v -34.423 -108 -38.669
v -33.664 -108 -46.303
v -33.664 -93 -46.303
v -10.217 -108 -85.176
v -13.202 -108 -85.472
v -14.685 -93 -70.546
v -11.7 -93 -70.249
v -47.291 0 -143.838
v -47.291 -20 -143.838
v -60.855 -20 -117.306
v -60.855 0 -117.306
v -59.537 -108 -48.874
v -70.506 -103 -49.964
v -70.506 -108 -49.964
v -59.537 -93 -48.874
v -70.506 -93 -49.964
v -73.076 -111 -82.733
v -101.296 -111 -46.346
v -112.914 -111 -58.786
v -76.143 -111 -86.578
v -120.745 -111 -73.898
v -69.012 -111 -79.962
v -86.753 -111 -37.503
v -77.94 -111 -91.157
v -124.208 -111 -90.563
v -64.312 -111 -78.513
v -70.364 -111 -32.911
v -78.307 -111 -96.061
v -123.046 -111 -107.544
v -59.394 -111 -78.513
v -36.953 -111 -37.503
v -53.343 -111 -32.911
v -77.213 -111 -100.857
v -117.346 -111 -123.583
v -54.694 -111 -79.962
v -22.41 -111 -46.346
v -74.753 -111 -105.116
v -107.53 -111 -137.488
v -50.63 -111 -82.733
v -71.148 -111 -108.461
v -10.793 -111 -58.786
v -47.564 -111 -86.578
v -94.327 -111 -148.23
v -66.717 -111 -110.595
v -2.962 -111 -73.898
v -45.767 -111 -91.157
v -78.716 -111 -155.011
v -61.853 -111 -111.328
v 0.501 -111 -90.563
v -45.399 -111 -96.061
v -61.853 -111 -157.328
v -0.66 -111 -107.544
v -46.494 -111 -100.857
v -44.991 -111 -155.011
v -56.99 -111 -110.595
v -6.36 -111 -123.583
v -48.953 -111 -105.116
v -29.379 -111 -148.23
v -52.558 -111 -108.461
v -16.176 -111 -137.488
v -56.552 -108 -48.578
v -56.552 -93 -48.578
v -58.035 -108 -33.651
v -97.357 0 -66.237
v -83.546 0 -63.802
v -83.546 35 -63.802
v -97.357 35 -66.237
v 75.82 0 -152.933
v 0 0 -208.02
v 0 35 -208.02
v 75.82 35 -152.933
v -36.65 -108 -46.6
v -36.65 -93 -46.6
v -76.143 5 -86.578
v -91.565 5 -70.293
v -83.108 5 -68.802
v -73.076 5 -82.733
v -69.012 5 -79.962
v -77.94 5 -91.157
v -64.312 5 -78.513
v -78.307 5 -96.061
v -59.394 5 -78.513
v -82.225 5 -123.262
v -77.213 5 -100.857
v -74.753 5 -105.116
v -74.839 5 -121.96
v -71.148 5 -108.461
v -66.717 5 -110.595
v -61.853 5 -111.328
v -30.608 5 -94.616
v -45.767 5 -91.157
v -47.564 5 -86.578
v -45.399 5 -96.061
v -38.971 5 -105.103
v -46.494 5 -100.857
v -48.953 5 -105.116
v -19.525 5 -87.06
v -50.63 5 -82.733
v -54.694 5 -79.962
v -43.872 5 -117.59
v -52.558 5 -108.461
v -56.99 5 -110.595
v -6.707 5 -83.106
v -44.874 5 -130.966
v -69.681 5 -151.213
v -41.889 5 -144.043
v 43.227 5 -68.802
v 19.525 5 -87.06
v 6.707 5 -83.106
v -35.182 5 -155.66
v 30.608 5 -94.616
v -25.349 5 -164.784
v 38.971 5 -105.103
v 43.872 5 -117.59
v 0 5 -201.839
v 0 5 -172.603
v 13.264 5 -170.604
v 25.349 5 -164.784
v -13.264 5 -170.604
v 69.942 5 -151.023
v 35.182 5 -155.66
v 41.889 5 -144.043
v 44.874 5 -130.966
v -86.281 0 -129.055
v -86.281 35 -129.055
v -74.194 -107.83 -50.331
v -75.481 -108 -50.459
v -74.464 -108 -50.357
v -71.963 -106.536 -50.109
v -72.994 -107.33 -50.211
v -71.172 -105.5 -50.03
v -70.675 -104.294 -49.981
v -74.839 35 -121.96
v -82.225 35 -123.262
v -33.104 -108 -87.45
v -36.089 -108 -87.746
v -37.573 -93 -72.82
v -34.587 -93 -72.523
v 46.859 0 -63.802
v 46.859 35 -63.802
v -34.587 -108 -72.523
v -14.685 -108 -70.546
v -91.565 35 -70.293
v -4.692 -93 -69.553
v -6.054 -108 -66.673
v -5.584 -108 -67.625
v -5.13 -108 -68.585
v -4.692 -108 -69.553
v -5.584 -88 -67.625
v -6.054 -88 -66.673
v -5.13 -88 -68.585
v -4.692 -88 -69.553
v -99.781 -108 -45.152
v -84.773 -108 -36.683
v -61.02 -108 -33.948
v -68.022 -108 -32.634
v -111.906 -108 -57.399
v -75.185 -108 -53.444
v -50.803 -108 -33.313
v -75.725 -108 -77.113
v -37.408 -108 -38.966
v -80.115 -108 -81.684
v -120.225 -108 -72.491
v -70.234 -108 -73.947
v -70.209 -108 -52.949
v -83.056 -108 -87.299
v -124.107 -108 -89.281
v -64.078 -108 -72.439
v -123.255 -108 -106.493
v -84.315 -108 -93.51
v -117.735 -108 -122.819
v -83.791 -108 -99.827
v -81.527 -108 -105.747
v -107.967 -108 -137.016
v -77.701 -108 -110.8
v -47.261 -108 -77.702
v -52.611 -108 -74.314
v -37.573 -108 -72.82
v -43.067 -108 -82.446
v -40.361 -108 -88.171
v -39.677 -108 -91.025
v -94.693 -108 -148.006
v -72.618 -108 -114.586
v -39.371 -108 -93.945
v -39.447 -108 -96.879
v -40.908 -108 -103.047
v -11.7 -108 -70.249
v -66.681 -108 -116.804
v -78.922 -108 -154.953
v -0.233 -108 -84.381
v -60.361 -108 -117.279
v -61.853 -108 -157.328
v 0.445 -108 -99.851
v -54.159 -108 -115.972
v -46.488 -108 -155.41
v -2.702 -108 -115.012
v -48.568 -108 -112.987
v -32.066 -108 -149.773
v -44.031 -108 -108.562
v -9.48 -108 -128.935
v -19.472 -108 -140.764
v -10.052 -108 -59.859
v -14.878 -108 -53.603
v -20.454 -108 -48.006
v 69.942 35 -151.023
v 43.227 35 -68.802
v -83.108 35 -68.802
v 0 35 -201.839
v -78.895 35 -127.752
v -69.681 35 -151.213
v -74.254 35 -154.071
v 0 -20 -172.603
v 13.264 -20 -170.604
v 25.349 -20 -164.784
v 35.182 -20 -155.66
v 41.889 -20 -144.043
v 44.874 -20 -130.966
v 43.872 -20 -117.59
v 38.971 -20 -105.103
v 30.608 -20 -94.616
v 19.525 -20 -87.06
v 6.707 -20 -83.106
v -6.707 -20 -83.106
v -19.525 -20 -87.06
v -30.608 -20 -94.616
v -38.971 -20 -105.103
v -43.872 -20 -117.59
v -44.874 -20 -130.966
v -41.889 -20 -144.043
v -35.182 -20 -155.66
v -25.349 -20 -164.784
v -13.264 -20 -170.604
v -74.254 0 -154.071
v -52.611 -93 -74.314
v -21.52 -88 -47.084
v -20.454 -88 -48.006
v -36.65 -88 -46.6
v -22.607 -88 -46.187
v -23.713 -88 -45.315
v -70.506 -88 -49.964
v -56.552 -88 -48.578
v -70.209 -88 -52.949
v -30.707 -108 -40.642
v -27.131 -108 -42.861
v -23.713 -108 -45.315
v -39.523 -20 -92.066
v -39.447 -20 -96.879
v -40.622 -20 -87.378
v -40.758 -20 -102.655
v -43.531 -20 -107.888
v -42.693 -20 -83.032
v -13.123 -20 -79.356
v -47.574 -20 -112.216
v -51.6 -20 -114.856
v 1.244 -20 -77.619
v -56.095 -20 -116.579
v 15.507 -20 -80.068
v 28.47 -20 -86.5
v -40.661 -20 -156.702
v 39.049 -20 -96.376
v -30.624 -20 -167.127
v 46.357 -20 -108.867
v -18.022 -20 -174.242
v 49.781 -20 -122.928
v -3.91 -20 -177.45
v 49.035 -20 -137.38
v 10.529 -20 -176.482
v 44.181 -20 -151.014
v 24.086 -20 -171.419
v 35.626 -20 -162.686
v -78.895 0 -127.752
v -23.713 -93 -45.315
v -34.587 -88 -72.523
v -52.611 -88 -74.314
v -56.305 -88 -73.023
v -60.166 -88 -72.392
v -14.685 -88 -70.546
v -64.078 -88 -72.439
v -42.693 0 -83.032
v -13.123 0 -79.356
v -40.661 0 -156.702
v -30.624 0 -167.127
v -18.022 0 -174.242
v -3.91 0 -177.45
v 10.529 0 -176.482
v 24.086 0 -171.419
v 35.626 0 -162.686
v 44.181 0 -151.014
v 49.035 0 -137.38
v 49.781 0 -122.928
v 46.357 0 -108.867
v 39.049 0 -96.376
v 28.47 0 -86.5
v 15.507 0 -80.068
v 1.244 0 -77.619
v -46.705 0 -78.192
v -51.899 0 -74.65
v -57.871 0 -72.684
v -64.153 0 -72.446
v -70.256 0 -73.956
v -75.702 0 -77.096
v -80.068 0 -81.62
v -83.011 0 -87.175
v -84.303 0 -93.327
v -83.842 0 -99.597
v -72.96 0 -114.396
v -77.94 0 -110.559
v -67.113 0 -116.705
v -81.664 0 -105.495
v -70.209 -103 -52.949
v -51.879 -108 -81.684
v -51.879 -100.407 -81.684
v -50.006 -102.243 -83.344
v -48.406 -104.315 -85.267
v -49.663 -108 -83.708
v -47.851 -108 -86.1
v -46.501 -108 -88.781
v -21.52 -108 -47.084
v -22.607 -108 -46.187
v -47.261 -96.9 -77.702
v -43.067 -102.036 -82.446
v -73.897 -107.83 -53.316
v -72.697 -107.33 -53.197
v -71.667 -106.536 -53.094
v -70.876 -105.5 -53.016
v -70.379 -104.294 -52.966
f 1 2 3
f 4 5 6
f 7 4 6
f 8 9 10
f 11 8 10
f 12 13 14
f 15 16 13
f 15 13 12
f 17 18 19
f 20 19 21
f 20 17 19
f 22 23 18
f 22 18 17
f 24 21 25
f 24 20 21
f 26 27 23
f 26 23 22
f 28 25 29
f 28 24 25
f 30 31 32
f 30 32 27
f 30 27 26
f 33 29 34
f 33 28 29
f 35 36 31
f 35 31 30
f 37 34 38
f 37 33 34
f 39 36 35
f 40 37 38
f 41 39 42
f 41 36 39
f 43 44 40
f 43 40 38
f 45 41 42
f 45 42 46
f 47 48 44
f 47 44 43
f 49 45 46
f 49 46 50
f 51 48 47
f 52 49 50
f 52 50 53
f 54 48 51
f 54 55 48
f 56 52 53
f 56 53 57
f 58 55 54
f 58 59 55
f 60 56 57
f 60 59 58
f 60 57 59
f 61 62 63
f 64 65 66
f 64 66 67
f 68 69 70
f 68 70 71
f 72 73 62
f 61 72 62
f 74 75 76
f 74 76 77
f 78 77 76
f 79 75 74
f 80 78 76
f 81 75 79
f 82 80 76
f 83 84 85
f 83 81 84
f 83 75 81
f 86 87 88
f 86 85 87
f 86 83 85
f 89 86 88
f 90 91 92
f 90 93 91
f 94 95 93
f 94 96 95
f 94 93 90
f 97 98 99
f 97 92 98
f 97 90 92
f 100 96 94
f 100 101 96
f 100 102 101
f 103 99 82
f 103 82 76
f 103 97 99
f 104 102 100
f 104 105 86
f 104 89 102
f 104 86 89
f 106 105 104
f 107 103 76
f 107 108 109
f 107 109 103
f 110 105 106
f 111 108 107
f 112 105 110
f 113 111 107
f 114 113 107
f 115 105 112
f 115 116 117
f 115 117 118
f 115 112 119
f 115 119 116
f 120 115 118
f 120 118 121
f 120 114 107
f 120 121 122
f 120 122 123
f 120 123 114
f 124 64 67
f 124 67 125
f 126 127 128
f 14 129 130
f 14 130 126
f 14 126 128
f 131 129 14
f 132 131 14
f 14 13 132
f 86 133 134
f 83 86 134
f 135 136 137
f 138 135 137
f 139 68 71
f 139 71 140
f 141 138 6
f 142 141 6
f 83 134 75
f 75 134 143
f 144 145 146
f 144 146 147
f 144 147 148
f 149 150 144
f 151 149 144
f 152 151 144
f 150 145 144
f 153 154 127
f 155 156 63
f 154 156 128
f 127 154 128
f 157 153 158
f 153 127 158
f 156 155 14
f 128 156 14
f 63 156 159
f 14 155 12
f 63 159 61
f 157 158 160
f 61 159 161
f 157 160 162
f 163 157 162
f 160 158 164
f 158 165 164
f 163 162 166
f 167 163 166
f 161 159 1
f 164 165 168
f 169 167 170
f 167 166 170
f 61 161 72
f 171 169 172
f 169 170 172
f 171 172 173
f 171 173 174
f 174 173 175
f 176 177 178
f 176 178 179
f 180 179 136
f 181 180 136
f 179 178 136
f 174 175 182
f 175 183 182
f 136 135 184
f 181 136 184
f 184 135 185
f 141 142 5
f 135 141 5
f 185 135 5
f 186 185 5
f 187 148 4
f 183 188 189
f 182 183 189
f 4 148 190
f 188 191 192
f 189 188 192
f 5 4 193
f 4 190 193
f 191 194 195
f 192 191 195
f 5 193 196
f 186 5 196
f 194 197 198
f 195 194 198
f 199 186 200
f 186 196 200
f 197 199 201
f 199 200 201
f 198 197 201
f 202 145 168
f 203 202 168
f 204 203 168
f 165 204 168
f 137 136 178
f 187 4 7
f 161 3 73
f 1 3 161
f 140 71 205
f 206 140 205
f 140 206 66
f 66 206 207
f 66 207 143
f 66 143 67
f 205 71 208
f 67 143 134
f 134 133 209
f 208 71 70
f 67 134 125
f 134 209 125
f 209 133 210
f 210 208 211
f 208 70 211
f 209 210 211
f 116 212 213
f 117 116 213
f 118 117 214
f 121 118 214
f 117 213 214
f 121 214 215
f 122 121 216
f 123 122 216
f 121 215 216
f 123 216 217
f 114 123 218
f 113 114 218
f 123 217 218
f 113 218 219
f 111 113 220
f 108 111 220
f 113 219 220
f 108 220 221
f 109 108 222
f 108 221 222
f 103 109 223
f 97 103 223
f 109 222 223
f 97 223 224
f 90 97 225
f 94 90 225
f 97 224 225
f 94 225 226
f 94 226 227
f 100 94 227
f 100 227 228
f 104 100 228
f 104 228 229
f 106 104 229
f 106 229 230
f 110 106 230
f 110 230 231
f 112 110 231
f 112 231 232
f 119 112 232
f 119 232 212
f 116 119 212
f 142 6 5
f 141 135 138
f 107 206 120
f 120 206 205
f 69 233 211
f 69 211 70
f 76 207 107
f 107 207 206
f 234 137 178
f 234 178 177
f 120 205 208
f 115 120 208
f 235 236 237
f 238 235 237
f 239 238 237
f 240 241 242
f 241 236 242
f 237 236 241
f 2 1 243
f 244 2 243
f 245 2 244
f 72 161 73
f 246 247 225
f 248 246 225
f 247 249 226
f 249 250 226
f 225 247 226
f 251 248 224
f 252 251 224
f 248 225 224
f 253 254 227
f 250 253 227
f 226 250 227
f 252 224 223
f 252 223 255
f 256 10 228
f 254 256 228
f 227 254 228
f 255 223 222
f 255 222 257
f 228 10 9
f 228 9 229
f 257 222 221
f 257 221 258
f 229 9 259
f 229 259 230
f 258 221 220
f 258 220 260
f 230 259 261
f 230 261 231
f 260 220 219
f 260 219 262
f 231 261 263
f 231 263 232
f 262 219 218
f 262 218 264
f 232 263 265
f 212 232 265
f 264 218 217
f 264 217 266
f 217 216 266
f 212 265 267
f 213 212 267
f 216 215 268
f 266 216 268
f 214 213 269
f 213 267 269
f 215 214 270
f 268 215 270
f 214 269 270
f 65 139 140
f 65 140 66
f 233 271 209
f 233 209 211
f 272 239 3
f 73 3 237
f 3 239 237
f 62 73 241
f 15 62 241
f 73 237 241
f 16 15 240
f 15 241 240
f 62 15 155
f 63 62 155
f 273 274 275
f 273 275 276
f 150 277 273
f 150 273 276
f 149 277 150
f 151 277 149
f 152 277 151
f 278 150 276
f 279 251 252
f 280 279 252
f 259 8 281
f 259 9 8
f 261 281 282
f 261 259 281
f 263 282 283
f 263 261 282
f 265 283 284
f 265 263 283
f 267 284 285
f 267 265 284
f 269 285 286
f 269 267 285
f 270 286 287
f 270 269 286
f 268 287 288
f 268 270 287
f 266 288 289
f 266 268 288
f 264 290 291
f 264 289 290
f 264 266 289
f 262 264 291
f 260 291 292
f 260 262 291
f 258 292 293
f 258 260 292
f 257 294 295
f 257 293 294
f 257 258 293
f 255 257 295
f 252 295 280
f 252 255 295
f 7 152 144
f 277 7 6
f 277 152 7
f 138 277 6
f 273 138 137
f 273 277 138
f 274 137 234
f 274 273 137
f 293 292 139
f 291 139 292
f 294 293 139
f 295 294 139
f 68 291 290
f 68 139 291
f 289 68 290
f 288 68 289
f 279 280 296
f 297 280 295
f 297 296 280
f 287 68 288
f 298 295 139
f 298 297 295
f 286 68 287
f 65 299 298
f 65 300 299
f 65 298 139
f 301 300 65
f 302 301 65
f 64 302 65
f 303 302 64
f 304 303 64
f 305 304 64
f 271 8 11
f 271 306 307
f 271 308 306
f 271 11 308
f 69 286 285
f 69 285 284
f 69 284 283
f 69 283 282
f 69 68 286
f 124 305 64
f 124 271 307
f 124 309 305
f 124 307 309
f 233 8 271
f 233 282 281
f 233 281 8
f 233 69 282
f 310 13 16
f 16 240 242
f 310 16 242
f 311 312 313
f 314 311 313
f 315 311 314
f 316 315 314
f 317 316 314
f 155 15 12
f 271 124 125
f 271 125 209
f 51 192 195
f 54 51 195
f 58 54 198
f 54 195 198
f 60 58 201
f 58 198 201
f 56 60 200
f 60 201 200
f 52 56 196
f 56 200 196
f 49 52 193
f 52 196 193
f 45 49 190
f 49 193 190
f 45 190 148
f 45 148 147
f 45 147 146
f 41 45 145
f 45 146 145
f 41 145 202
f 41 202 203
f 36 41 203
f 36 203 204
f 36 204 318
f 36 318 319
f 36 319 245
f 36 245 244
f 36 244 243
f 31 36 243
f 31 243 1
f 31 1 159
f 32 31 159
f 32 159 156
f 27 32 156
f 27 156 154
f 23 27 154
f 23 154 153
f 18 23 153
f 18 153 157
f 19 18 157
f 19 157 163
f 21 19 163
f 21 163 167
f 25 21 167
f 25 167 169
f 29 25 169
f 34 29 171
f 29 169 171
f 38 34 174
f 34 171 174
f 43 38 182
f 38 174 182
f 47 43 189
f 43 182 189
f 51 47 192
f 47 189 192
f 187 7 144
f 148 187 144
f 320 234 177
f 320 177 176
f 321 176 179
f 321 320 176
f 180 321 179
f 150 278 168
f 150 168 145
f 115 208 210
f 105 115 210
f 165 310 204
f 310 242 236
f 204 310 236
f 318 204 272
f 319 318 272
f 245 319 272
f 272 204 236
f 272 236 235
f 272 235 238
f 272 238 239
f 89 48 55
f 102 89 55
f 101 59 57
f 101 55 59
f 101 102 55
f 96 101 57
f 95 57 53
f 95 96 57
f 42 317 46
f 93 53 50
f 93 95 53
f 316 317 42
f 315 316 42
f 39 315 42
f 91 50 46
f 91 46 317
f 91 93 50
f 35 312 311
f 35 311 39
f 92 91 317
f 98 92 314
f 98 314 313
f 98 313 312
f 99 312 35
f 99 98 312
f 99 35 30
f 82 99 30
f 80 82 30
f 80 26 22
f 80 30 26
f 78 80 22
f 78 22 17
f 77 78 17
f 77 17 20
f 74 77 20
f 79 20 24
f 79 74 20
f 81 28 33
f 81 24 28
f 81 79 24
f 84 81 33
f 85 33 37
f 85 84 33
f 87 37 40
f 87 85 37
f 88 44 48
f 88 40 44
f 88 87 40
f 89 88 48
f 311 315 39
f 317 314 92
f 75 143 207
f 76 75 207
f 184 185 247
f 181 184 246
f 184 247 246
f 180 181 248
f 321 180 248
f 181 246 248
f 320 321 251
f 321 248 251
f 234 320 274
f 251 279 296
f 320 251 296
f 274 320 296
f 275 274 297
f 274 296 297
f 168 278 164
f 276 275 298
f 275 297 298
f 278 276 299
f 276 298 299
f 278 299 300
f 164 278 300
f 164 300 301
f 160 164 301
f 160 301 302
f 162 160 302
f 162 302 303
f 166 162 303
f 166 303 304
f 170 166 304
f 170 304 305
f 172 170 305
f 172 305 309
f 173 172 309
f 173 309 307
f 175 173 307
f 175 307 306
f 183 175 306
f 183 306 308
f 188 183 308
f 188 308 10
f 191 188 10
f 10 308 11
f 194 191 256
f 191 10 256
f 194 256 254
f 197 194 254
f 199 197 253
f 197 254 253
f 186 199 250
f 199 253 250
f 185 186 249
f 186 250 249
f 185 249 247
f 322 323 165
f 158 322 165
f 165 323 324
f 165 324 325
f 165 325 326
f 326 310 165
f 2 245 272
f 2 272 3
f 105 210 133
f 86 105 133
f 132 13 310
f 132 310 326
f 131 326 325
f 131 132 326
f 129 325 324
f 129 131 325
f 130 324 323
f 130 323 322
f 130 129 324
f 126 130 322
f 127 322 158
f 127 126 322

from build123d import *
from build123d.topology import SkipClean

# Parameters (mm, degrees)
SKETCH1_R               = 45
BOSS_EXTRUDE1_DEPTH     = 35
CUT_EXTRUDE1_DEPTH      = 30
BOSS_EXTRUDE2_START     = 20
SKETCH3_R               = 50
SKETCH3_R_2             = 45
BOSS_EXTRUDE2_DEPTH     = 20
SKETCH4_R               = 22.5
BOSS_EXTRUDE3_DEPTH     = 108
SKETCH5_R               = 62.5
BOSS_EXTRUDE4_DEPTH     = 3
CUT_EXTRUDE2_DEPTH      = 283.934340716
CUT_EXTRUDE2_DEPTH_BACK = 283.934340716
SKETCH6_R               = 16.5
CHAMFER1_START          = -20
CHAMFER1_DEPTH          = 20
BOSS_EXTRUDE5_START     = 20
BOSS_EXTRUDE5_DEPTH     = 20
CHAMFER3_START          = -59.701385296
CHAMFER3_DEPTH          = 31.623598411
CHAMFER3_START_2        = -32.908910756
CHAMFER3_2_DEPTH        = 24.320342802
CHAMFER3_START_3        = -75.100600507
CHAMFER3_3_DEPTH        = 17.710815412
CHAMFER3_START_4        = -108
CHAMFER3_4_DEPTH        = 20.0000001
CUT_EXTRUDE3_START      = 20
CUT_EXTRUDE3_DEPTH      = 20
CUT_EXTRUDE4_DEPTH      = 3
FILLET2_R               = 5


with BuildPart() as part:
    # Sketch1 → Boss-Extrude1 (new body)
    with BuildSketch(Plane(origin=(0, 0, 0), x_dir=(1, 0, 0), z_dir=(0, 1, 0))):
        Polygon((46.859255168, 63.80155033), (-83.545615043, 63.80155033), (-97.357476794, 66.23695421), (-86.281022646, 129.054647247), (-78.894964498, 127.752285914), (-74.254340533, 154.070572239), (0, 208.019508525), (75.819867549, 152.933150283), align=None)
        with Locations(Location((0, 127.60310066, 0), (0, 0, 90))):
            Circle(SKETCH1_R, mode=Mode.SUBTRACT)
    extrude(amount=BOSS_EXTRUDE1_DEPTH)

    # Sketch2 → Cut-Extrude1 (cut)
    with BuildSketch(Plane(origin=(0, 35, 0), x_dir=(1, 0, 0), z_dir=(0, 1, 0))):
        Polygon((69.942015026, 151.023320226), (0, 201.839168637), (-69.681093857, 151.212890552), (-74.839166621, 121.960006261), (-82.225224769, 123.262367593), (-91.56519714, 70.292752087), (-83.108171726, 68.80155033), (43.226542528, 68.80155033), align=None)
    extrude(amount=-CUT_EXTRUDE1_DEPTH, mode=Mode.SUBTRACT)

    # Sketch3 → Boss-Extrude2 (add)
    with BuildSketch(Plane.XZ.offset(BOSS_EXTRUDE2_START)):
        with Locations(Location((0, -127.60310066, 0), (0, 0, 270))):
            Circle(SKETCH3_R)
        with Locations(Location((0, -127.60310066, 0), (0, 0, 270))):
            Circle(SKETCH3_R_2, mode=Mode.SUBTRACT)
    extrude(amount=-BOSS_EXTRUDE2_DEPTH)

    # Sketch4 → Boss-Extrude3 (add)
    with BuildSketch(Plane.XZ):
        with Locations(Location((-61.853227661, -94.828442341, 0), (0, 0, 354.769849307))):
            Circle(SKETCH4_R)
    extrude(amount=BOSS_EXTRUDE3_DEPTH)

    # Sketch5 → Boss-Extrude4 (add)
    with BuildSketch(Plane.XZ.offset(108)):
        with Locations(Location((-61.853227661, -94.828442341, 0), (0, 0, 270))):
            Circle(SKETCH5_R)
    extrude(amount=BOSS_EXTRUDE4_DEPTH)

    # Sketch6 → Cut-Extrude2 (cut, two sides: drawn at the far end of the back side and taken through both)
    with BuildSketch(Plane.XZ.offset(111).offset(-CUT_EXTRUDE2_DEPTH_BACK)):
        with Locations(Location((-61.853227661, -94.828442341, 0), (0, 0, 270))):
            Circle(SKETCH6_R)
    extrude(amount=CUT_EXTRUDE2_DEPTH + CUT_EXTRUDE2_DEPTH_BACK, mode=Mode.SUBTRACT)

    # Chamfer1: read off the stored shape, not the designer's step
    # Chamfer1 outline → Chamfer1 (add)
    with BuildSketch(Plane(origin=(0, 0, 0), x_dir=(1, 0, 0), z_dir=(0, 1, 0)).offset(CHAMFER1_START)):
        with BuildLine():
            ThreePointArc((-47.573643712, 112.216469321), (-49.998001272, 128.050167568), (-47.290893773, 143.837981816))
            Line((-47.290893773, 143.837981816), (-60.85462884, 117.306271426))
            ThreePointArc((-60.85462884, 117.306271426), (-53.801380758, 115.838386688), (-47.573643712, 112.216469321))
        make_face()
        with BuildLine():
            Line((-42.693487755, 83.032071427), (-13.123343442, 79.356050419))
            ThreePointArc((-13.123343442, 79.356050419), (-27.706953652, 85.981895496), (-39.446904898, 96.879466533))
            ThreePointArc((-39.446904898, 96.879466533), (-39.947247216, 89.692488608), (-42.693487755, 83.032071427))
        make_face()
    extrude(amount=CHAMFER1_DEPTH)

    # Sketch7 → Boss-Extrude5 (add)
    with SkipClean():  # the faces are left unmerged after this step: merging them gives an invalid solid
        with BuildSketch(Plane(origin=(0, -108, 0), x_dir=(1, 0, 0), z_dir=(0, 1, 0)).offset(BOSS_EXTRUDE5_START)):
            with BuildLine():
                Line((-70.209230864, 52.9494319), (-20.454240978, 48.005649797))
                ThreePointArc((-20.454240978, 48.005649797), (-22.061100088, 46.632627344), (-23.713465467, 45.314721618))
                Line((-23.713465467, 45.314721618), (-70.50585779, 49.964132507))
                Line((-70.50585779, 49.964132507), (-70.209230864, 52.9494319))
            make_face()
            with BuildLine():
                Line((-64.077929608, 72.438696893), (-6.054139097, 66.673305768))
                ThreePointArc((-6.054139097, 66.673305768), (-5.354795719, 68.104348565), (-4.69214598, 69.552747672))
                Line((-4.69214598, 69.552747672), (-52.611335155, 74.314119956))
                ThreePointArc((-52.611335155, 74.314119956), (-58.221486515, 72.623477665), (-64.077929608, 72.438696893))
            make_face()
        extrude(amount=-BOSS_EXTRUDE5_DEPTH)

    # Chamfer3: read off the stored shape, not the designer's step
    # Chamfer3 outline → Chamfer3 (add)
    with SkipClean():  # the faces are left unmerged after this step: merging them gives an invalid solid
        with BuildSketch(Plane(origin=(0, 0, 0), x_dir=(0, 1, 0), z_dir=(0.9950997977115372, 0, 0.09887564206849853)).offset(CHAMFER3_START)):
            Polygon((-108, -68.747986192), (-108, -83.747986192), (-93, -68.747986192), align=None)
            Polygon((-108, -27.747986192), (-108, -42.747986192), (-93, -42.747986192), align=None)
        extrude(amount=CHAMFER3_DEPTH)

    # Chamfer3 2 outline → Chamfer3 2 (add)
    with SkipClean():  # the faces are left unmerged after this step: merging them gives an invalid solid
        with BuildSketch(Plane(origin=(0, 0, 0), x_dir=(0, 1, 0), z_dir=(0.9950997977115372, 0, 0.09887564206849853)).offset(CHAMFER3_START_2)):
            Polygon((-108, -68.747986192), (-108, -83.747986192), (-93, -68.747986192), align=None)
        extrude(amount=CHAMFER3_2_DEPTH)

    # Chamfer3 3 outline → Chamfer3 3 (add)
    with SkipClean():  # the faces are left unmerged after this step: merging them gives an invalid solid
        with BuildSketch(Plane(origin=(0, 0, 0), x_dir=(0, 1, 0), z_dir=(0.9950997977115372, 0, 0.09887564206849853)).offset(CHAMFER3_START_3)):
            Polygon((-108, -27.747986192), (-108, -42.747986192), (-93, -42.747986192), align=None)
        extrude(amount=CHAMFER3_3_DEPTH)

    # Chamfer3 4 outline → Chamfer3 4 (cut)
    with SkipClean():  # the faces are left unmerged after this step: merging them gives an invalid solid
        with BuildSketch(Plane(origin=(0, 0, 0), x_dir=(1, 0, 0), z_dir=(0, 1, 0)).offset(CHAMFER3_START_4)):
            with BuildLine():
                Line((-51.128200524, 89.240616922), (-51.879001502, 81.68443943))
                ThreePointArc((-51.879001502, 81.68443943), (-48.702503608, 84.863079484), (-46.501448484, 88.780891094))
                Line((-46.501448484, 88.780891094), (-51.128200524, 89.240616922))
            make_face()
            with BuildLine():
                ThreePointArc((-0.265846327, 84.186804289), (-2.029835327, 76.733920253), (-4.69214598, 69.552747672))
                Line((-4.69214598, 69.552747672), (-1.748980958, 69.260307324))
                Line((-1.748980958, 69.260307324), (-0.265846327, 84.186804289))
            make_face()
            with BuildLine():
                ThreePointArc((-23.713465467, 45.314721618), (-37.1988252, 37.396652892), (-52.227673534, 33.074100731))
                Line((-52.227673534, 33.074100731), (-25.196600099, 30.388224653))
                Line((-25.196600099, 30.388224653), (-23.713465467, 45.314721618))
            make_face()
        extrude(amount=CHAMFER3_4_DEPTH, mode=Mode.SUBTRACT)

    # Sketch9 → Cut-Extrude3 (cut)
    with SkipClean():  # the faces are left unmerged after this step: merging them gives an invalid solid
        with BuildSketch(Plane(origin=(0, -108, 0), x_dir=(1, 0, 0), z_dir=(0, 1, 0)).offset(CUT_EXTRUDE3_START)):
            Polygon((-61.020192816, 33.947747767), (-75.946689782, 35.430882398), (-74.463555151, 50.357379364), (-59.537058185, 48.874244733), align=None)
            Polygon((-56.551758792, 48.577617807), (-58.034893423, 33.651120841), (-38.132897469, 31.673608), (-36.649762838, 46.600104965), align=None)
            Polygon((-33.664463445, 46.303478039), (-35.147598076, 31.376981073), (-15.245602121, 29.399468232), (-13.76246749, 44.325965198), align=None)
            Polygon((-33.104139652, 87.449700478), (-34.587274283, 72.523203512), (-14.685278328, 70.54569067), (-13.202143697, 85.472187636), align=None)
            with BuildLine():
                Line((-36.089439045, 87.746327404), (-37.572573676, 72.819830438))
                Line((-37.572573676, 72.819830438), (-52.611335155, 74.314119956))
                ThreePointArc((-52.611335155, 74.314119956), (-44.996440318, 79.925465442), (-40.360787322, 88.170739412))
                Line((-40.360787322, 88.170739412), (-36.089439045, 87.746327404))
            make_face()
            with BuildLine():
                Line((-0.265846327, 84.186804289), (-10.216844304, 85.17556071))
                Line((-10.216844304, 85.17556071), (-11.699978935, 70.249063744))
                Line((-11.699978935, 70.249063744), (-4.69214598, 69.552747672))
                ThreePointArc((-4.69214598, 69.552747672), (-2.029835327, 76.733920253), (-0.265846327, 84.186804289))
            make_face()
        extrude(amount=-CUT_EXTRUDE3_DEPTH, mode=Mode.SUBTRACT)

    # Sketch10 → Cut-Extrude4 (cut)
    with SkipClean():  # the faces are left unmerged after this step: merging them gives an invalid solid
        with BuildSketch(Plane(origin=(-37.891198026, 0, -3.764965627), x_dir=(-0.09887564206850087, 0, 0.995099797711537), z_dir=(-0.995099797711537, 0, -0.09887564206850087))):
            Polygon((-42.747986192, -93), (-35.076363954, -108), (-30.076363954, -108), (-30.076363954, -93), align=None)
        extrude(amount=CUT_EXTRUDE4_DEPTH, mode=Mode.SUBTRACT)

    # Fillet2
    # the kernel refuses this fillet: 5 mm, written as the material it adds along each edge
    with BuildSketch(Plane(origin=(-70.50585779, -108, -49.964132507), x_dir=(-0.9950997977115372, 0, -0.09887564206849696), z_dir=(0.09887564206849697, 0, -0.9950997977115373))) as fillet2_piece_1:
        with BuildLine():
            CenterArc((FILLET2_R, FILLET2_R), FILLET2_R, 180, 90)
            Line((0, FILLET2_R), (0, 0))
            Line((0, 0), (FILLET2_R, 0))
        make_face()
    extrude(amount=3)


solid = part.part
